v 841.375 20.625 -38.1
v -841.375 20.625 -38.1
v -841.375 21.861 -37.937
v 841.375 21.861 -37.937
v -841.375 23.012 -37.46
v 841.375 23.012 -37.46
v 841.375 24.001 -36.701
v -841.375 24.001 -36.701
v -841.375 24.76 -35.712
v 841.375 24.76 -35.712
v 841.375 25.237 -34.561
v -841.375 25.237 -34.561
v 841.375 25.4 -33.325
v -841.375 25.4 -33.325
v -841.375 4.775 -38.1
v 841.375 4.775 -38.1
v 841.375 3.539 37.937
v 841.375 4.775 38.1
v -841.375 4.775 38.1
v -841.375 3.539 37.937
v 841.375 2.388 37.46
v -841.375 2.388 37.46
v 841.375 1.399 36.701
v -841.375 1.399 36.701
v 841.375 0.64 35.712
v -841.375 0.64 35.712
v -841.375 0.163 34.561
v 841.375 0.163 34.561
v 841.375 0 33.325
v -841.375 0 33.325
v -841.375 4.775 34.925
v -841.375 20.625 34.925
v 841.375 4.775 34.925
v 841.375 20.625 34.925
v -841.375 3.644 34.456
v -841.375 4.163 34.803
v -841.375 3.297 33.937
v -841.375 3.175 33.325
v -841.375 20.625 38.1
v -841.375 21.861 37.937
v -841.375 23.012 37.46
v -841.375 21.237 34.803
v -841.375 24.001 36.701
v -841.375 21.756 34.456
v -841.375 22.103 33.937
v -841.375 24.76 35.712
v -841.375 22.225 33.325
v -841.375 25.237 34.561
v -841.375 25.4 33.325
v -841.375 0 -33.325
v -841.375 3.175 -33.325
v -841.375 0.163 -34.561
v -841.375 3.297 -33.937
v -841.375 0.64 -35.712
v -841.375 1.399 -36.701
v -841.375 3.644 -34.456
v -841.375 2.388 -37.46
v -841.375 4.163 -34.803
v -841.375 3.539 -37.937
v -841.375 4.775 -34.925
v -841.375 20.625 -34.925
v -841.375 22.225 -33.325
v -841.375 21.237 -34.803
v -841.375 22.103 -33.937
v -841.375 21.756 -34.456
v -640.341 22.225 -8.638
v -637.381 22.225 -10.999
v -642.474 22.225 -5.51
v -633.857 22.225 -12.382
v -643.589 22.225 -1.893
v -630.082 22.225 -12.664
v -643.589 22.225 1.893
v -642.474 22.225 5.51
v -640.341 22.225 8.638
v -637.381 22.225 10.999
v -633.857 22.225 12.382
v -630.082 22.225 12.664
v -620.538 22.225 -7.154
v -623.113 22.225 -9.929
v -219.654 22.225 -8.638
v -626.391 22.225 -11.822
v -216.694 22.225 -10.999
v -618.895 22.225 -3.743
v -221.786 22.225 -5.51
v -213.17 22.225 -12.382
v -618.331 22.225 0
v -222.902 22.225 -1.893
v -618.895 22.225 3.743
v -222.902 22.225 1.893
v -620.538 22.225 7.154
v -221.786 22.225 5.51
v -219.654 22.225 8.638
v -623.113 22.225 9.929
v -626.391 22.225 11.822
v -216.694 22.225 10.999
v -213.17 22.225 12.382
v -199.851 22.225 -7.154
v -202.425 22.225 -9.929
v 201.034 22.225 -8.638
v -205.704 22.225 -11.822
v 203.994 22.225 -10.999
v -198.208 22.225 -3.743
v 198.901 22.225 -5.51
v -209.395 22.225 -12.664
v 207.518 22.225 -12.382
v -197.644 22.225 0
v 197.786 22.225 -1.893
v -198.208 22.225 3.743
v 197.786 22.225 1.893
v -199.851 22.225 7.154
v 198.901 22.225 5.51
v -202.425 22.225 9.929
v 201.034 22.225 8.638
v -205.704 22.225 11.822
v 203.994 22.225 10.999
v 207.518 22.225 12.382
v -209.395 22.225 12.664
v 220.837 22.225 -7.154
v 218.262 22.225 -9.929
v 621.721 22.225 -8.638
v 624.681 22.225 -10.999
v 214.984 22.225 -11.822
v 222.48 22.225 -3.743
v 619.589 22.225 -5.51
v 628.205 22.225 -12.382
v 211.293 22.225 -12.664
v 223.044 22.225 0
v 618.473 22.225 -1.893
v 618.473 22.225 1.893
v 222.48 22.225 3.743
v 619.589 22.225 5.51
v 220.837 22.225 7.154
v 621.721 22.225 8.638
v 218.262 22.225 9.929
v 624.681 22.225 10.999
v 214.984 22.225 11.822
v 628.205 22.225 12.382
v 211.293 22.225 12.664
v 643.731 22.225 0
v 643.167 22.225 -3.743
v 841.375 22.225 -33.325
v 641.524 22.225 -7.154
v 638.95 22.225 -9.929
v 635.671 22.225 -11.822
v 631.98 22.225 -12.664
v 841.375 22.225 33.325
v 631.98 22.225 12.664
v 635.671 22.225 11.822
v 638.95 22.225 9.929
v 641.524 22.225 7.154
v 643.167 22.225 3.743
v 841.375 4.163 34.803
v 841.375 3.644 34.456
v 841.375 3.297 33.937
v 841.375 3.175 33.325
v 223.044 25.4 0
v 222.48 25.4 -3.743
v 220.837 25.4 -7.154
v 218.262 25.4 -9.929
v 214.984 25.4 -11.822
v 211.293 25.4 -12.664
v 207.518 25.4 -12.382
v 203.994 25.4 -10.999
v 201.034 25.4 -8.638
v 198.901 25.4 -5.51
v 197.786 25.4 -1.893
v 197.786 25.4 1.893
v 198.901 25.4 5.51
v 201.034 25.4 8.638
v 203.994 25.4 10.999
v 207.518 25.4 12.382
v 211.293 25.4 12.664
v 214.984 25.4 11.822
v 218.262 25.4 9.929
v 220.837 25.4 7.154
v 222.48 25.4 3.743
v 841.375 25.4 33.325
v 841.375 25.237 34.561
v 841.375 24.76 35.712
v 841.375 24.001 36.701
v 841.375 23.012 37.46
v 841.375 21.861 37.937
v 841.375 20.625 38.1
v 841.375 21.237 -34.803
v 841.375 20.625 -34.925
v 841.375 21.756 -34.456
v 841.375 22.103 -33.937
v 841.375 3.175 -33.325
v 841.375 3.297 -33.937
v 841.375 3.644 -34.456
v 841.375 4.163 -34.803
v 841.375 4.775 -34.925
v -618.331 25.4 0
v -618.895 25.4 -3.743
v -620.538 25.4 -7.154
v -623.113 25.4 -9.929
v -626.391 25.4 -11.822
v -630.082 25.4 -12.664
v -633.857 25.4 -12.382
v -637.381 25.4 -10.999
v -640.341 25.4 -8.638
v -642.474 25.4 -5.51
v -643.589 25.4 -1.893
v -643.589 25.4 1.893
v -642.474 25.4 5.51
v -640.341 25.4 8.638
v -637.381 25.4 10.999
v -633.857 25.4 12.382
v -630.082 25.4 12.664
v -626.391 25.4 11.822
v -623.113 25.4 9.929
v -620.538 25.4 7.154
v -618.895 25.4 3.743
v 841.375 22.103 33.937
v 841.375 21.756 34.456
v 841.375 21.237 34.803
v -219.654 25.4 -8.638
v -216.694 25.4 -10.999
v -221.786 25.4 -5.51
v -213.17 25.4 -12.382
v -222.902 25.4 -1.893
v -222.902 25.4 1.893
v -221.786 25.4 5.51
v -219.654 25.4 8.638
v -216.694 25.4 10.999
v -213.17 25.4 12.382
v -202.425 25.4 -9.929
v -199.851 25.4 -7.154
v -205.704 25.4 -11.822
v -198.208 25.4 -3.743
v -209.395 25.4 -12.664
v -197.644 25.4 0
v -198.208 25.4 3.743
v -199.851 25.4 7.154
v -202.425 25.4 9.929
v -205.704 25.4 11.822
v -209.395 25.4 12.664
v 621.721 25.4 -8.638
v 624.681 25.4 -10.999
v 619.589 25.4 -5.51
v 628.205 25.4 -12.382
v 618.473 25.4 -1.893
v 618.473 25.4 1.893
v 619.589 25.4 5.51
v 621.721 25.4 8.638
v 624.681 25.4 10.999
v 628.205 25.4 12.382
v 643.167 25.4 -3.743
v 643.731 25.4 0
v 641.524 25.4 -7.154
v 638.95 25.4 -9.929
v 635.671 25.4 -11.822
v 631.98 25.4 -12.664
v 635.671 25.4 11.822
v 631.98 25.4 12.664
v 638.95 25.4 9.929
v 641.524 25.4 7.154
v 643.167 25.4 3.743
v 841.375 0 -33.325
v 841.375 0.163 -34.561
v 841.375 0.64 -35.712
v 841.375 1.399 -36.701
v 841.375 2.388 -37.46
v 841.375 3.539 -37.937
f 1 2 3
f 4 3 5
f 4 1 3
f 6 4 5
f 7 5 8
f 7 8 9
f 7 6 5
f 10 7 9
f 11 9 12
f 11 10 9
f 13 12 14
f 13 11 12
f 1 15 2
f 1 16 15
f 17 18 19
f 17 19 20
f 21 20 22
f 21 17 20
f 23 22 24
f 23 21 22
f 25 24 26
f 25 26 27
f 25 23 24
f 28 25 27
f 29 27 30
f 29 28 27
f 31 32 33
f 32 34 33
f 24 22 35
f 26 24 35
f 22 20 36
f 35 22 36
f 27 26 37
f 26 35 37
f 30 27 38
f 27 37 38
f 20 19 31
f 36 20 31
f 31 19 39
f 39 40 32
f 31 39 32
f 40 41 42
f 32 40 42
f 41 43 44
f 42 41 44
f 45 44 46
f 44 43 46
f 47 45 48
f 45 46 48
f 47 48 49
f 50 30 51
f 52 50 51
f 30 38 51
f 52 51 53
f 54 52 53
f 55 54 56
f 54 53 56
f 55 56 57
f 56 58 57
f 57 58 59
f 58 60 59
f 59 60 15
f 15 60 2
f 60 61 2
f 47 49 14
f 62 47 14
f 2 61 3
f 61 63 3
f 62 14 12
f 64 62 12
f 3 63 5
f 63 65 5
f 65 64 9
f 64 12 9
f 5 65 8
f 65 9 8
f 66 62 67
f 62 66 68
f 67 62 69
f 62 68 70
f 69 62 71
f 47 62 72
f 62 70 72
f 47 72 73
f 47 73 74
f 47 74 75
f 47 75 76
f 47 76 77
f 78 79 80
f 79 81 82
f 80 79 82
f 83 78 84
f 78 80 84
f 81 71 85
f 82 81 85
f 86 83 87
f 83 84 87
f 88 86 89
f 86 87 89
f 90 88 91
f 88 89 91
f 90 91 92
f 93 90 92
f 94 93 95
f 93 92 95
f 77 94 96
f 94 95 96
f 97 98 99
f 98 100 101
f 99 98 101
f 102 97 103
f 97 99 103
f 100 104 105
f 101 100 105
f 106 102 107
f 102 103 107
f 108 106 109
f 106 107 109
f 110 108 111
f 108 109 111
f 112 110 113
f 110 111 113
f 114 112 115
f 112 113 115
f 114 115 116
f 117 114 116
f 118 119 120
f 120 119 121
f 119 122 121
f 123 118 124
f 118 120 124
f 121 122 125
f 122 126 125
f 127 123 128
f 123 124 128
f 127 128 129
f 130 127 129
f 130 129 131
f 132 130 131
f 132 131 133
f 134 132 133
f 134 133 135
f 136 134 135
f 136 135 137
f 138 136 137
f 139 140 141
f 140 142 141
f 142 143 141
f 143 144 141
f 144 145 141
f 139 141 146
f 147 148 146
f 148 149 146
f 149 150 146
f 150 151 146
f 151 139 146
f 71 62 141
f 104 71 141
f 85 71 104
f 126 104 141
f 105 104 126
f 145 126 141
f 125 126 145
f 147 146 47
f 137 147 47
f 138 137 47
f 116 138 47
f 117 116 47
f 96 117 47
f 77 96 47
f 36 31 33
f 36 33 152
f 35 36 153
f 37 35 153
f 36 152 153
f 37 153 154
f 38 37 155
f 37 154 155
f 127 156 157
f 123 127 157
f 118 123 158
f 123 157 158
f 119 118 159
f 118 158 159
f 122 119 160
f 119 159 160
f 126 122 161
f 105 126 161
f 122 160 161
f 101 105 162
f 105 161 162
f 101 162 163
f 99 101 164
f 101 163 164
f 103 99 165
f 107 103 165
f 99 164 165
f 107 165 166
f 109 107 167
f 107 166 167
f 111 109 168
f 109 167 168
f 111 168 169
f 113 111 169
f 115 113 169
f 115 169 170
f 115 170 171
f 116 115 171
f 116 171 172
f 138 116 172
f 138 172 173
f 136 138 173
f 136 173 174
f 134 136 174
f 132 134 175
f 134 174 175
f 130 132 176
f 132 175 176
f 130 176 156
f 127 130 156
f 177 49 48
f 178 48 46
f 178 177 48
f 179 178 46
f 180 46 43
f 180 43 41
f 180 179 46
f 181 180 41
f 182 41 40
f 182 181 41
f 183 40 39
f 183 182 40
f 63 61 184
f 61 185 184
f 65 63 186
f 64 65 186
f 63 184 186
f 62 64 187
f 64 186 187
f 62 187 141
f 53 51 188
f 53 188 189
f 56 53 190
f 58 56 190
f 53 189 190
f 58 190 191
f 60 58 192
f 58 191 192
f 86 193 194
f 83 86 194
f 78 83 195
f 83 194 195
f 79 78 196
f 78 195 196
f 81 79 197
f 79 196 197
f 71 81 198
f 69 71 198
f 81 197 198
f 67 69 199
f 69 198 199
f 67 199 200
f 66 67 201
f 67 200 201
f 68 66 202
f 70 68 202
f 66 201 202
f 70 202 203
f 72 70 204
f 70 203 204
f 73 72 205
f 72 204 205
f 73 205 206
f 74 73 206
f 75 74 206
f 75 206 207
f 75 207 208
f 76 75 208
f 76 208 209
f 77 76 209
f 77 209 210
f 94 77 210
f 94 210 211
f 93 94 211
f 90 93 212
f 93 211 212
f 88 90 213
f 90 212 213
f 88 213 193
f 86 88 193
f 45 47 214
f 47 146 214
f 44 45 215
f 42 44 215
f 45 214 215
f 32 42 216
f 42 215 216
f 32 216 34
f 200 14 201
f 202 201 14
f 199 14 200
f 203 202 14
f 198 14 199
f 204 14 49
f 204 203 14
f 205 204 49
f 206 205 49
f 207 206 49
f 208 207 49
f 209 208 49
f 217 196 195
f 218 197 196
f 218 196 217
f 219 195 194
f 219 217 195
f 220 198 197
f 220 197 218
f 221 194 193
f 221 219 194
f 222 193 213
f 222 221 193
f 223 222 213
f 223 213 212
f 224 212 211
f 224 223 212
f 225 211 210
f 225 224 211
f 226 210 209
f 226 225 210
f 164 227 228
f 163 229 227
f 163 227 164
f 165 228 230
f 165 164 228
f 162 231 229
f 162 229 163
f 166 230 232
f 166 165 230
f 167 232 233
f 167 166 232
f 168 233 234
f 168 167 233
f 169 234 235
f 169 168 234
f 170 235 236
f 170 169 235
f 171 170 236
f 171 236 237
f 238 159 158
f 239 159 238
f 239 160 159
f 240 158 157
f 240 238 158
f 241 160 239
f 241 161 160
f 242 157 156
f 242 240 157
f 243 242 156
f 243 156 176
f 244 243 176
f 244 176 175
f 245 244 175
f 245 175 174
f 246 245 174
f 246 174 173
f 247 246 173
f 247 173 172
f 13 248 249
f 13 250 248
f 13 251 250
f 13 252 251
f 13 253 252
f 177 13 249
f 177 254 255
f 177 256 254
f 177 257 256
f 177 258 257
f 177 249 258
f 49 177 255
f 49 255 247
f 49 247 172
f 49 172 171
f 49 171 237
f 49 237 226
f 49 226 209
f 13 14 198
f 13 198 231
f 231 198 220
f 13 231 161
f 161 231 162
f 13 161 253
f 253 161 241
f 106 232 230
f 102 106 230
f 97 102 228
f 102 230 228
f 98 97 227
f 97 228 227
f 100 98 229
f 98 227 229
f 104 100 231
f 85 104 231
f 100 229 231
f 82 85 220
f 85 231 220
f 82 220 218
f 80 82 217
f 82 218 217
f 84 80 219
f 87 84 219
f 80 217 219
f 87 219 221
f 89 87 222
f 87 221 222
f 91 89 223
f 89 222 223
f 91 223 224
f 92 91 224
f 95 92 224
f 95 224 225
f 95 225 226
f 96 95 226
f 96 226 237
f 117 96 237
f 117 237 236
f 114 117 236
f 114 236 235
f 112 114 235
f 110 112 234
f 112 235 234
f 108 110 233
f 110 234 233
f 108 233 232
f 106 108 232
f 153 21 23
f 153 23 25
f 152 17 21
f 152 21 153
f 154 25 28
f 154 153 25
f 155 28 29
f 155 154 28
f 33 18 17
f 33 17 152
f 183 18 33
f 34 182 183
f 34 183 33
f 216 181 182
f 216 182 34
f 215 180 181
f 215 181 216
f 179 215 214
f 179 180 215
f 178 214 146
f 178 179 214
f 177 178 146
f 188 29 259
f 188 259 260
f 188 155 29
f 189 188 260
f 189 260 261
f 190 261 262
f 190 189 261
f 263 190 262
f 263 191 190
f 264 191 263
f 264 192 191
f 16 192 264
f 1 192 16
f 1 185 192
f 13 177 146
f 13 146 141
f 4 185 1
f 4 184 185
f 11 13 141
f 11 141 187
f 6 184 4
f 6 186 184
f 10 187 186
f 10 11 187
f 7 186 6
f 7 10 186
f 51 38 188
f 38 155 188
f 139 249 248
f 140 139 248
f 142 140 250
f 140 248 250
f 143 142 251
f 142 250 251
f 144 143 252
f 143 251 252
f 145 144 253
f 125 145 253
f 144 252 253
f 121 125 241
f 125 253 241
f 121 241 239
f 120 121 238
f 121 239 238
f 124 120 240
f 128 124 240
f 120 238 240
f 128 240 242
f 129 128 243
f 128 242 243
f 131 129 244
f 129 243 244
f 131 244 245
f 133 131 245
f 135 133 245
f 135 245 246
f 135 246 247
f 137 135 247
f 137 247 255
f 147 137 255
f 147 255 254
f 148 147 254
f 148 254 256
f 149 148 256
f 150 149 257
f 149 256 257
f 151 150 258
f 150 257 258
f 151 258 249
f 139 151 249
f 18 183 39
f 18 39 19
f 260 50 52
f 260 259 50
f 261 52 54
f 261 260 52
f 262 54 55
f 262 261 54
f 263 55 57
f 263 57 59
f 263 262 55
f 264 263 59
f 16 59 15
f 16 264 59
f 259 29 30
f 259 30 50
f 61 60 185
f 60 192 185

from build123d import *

# Parameters (mm, degrees)
BOSS_EXTRUDE1_DEPTH = 841.375
SKETCH2_R           = 12.7
CUT_EXTRUDE1_DEPTH  = 3.175
LPATTERN1_COUNT     = 4
LPATTERN1_PITCH     = 420.6875


with BuildPart() as part:
    # Sketch1 → Boss-Extrude1 (new body, symmetric)
    with BuildSketch(Plane(origin=(0, 0, 0), x_dir=(0, 0, -1), z_dir=(1, 0, 0))):
        with BuildLine():
            Line((33.3248, 25.4), (-33.3248, 25.4))
            ThreePointArc((-33.3248, 25.4), (-36.701376302, 24.001376302), (-38.1, 20.6248))
            Line((-38.1, 20.6248), (-38.1, 4.7752))
            ThreePointArc((-38.1, 4.7752), (-36.701376302, 1.398623698), (-33.3248, 0))
            Line((-33.3248, 0), (33.3248, 0))
            ThreePointArc((33.3248, 0), (36.701376302, 1.398623698), (38.1, 4.7752))
            Line((38.1, 4.7752), (38.1, 20.6248))
            ThreePointArc((38.1, 20.6248), (36.701376302, 24.001376302), (33.3248, 25.4))
        make_face()
        with BuildLine():
            Line((33.3248, 22.225), (-33.3248, 22.225))
            ThreePointArc((-33.3248, 22.225), (-34.456312271, 21.756312271), (-34.925, 20.6248))
            Line((-34.925, 20.6248), (-34.925, 4.7752))
            ThreePointArc((-34.925, 4.7752), (-34.456312271, 3.643687729), (-33.3248, 3.175))
            Line((-33.3248, 3.175), (33.3248, 3.175))
            ThreePointArc((33.3248, 3.175), (34.456312271, 3.643687729), (34.925, 4.7752))
            Line((34.925, 4.7752), (34.925, 20.6248))
            ThreePointArc((34.925, 20.6248), (34.456312271, 21.756312271), (33.3248, 22.225))
        make_face(mode=Mode.SUBTRACT)
    extrude(amount=BOSS_EXTRUDE1_DEPTH, both=True)

    # Sketch2 → Cut-Extrude1 (cut)
    with BuildSketch(Plane(origin=(0, 25.4, 0), x_dir=(1, 0, 0), z_dir=(0, 1, 0))):
        with Locations((-631.03125, 0)):
            Circle(SKETCH2_R)
    cut_extrude1 = extrude(amount=-CUT_EXTRUDE1_DEPTH, mode=Mode.SUBTRACT)

    # LPattern1: Cut-Extrude1 ×4
    with Locations(*[(i * LPATTERN1_PITCH, 0, 0) for i in range(1, LPATTERN1_COUNT)]):
        add(cut_extrude1, mode=Mode.SUBTRACT)


solid = part.part
